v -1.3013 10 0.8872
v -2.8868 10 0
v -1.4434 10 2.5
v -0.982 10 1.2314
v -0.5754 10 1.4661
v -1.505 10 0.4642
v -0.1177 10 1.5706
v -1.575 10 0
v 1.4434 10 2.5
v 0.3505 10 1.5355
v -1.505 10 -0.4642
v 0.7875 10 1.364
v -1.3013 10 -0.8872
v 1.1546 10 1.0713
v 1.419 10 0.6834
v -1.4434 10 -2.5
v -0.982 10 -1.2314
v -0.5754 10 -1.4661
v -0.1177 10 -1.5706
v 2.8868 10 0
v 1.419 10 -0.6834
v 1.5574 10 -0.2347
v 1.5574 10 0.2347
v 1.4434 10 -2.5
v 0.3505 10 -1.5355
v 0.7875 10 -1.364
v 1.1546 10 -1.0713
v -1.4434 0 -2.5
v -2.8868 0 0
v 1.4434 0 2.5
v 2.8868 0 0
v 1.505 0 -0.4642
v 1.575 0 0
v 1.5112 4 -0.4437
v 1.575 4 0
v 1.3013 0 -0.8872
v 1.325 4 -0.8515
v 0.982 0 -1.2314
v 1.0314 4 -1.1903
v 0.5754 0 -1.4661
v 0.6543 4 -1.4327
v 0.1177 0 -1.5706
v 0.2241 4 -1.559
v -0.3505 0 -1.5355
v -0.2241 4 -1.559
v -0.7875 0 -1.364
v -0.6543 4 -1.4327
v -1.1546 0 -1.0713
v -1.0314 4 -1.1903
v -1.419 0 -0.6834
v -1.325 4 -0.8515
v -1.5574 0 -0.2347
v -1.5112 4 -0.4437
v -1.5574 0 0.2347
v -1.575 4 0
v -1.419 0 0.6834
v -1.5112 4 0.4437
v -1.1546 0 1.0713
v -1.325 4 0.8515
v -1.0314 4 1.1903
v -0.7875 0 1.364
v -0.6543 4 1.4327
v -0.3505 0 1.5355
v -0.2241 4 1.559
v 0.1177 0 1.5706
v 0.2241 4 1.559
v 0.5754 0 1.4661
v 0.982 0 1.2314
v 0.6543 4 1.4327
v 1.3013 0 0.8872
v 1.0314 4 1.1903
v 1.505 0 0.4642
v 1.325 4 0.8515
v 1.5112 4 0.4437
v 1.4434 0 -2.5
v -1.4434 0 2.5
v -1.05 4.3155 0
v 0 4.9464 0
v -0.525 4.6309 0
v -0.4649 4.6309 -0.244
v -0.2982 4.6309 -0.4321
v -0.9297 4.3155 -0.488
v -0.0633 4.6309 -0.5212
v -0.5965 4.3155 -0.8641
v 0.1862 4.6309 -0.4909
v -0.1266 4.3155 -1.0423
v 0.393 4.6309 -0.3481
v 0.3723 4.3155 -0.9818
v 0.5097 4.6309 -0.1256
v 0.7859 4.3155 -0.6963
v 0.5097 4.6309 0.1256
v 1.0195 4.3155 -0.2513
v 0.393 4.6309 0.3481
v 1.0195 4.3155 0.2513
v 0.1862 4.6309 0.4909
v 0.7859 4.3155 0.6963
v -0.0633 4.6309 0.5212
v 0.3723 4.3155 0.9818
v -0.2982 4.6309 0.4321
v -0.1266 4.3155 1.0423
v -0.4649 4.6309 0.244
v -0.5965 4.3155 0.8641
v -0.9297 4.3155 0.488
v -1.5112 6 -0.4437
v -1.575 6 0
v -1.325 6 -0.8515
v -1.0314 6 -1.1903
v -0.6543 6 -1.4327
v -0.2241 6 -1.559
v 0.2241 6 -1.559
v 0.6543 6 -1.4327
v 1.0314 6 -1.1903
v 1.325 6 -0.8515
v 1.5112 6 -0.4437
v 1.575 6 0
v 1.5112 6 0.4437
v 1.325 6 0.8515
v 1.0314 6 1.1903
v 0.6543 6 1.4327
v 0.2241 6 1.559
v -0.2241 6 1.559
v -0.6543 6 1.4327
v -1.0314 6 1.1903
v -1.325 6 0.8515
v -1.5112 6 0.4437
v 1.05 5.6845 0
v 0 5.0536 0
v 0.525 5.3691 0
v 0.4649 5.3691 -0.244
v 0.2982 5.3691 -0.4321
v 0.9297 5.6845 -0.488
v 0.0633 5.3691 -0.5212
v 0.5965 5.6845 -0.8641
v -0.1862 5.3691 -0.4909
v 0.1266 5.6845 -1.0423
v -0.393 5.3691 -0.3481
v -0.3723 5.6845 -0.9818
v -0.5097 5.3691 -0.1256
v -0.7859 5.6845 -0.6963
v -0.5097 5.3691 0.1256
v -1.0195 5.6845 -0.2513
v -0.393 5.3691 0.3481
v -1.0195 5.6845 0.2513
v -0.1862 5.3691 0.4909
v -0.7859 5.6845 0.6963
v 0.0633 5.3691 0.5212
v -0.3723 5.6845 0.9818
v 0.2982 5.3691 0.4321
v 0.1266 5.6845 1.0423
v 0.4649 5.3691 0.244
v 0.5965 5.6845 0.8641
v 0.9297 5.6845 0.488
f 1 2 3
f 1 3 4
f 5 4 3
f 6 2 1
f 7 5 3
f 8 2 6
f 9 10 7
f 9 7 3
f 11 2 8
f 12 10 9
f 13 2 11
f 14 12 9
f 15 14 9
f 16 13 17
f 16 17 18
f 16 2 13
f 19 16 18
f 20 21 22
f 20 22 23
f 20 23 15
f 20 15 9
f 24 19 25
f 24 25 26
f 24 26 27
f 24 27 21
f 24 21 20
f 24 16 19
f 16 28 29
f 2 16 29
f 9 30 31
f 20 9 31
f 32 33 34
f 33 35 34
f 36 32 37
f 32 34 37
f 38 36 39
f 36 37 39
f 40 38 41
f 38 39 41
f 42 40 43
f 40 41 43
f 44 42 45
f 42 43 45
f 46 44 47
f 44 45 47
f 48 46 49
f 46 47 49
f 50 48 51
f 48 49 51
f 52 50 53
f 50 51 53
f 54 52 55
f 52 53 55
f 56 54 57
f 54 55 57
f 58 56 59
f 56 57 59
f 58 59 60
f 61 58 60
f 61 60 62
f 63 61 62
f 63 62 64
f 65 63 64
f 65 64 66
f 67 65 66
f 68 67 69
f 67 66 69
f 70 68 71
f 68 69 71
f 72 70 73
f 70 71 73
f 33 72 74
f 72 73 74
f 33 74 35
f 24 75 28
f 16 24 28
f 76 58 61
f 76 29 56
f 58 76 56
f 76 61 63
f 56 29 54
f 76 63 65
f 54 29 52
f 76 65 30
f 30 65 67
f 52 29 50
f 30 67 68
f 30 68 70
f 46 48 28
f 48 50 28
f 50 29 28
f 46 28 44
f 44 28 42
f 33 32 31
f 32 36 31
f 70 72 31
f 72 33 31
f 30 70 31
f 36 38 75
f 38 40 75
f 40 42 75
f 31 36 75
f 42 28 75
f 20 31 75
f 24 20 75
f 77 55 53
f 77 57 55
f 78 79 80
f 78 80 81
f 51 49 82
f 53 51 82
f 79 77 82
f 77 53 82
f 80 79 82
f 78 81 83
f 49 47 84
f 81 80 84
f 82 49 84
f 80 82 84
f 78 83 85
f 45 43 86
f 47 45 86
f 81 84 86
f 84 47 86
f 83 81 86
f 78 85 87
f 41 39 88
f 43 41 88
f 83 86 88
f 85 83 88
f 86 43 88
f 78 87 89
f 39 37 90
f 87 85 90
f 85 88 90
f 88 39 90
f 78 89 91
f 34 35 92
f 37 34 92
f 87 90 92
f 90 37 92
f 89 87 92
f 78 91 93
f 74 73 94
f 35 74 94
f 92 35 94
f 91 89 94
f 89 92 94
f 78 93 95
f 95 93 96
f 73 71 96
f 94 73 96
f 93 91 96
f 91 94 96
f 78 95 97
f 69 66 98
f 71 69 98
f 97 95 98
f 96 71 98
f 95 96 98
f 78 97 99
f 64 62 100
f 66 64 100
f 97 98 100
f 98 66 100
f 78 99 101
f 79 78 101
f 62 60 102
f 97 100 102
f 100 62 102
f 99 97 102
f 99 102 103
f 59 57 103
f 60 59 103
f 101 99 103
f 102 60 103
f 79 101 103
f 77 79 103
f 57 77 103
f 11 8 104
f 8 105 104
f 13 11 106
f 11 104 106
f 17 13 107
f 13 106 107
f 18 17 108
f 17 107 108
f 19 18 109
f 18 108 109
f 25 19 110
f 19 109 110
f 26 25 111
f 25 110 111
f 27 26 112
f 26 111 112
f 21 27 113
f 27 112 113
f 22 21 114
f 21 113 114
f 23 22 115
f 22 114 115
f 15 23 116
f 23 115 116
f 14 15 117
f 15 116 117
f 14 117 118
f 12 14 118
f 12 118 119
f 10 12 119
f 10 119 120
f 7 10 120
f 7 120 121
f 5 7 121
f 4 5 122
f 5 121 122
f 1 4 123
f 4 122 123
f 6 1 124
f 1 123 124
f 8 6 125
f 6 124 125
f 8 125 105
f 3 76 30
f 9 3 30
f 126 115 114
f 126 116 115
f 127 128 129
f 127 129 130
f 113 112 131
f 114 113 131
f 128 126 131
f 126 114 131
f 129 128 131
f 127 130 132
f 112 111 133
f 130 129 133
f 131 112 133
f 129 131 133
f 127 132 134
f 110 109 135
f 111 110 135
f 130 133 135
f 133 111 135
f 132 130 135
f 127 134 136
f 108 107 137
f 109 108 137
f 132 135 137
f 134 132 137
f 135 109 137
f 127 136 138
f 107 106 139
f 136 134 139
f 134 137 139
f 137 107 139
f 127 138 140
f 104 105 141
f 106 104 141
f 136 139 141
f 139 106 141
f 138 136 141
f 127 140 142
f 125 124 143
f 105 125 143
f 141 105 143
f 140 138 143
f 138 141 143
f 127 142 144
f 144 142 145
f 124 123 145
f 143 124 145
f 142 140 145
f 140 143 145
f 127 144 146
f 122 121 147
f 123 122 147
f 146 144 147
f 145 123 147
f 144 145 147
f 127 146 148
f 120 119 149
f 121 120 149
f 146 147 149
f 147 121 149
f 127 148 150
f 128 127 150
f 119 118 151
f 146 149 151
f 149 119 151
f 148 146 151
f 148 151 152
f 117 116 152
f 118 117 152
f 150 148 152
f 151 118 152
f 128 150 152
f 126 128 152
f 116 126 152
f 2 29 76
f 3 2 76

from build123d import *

# Parameters (mm, degrees)
EXTRUDE_1_DEPTH         = 10
HOLE_WIZARD_M36_D       = 3.15
HOLE_WIZARD_M36_DEPTH   = 4
HOLE_WIZARD_M36_TIP     = 0.946355475
HOLE_WIZARD_M36_2_D     = 3.15
HOLE_WIZARD_M36_2_DEPTH = 4
HOLE_WIZARD_M36_2_TIP   = 0.946355475


with BuildPart() as part:
    # Эскиз1 → Бобышка-Вытянуть1 (new body)
    with BuildSketch(Plane(origin=(0, 0, 0), x_dir=(1, 0, 0), z_dir=(0, 1, 0))):
        Polygon((2.886751346, 0), (1.443375673, 2.5), (-1.443375673, 2.5), (-2.886751346, 0), (-1.443375673, -2.5), (1.443375673, -2.5), align=None)
    extrude(amount=EXTRUDE_1_DEPTH)

    # Hole Wizard M36
    with Locations(Plane(origin=(0, 10, 0), x_dir=(1, 0, 0), z_dir=(0, 1, 0))):
        with Locations((0, 0)):
            Hole(HOLE_WIZARD_M36_D / 2, depth=HOLE_WIZARD_M36_DEPTH)
            with Locations((0, 0, -(HOLE_WIZARD_M36_DEPTH + HOLE_WIZARD_M36_TIP / 2))):  # 118° drill point
                Cone(0, HOLE_WIZARD_M36_D / 2, HOLE_WIZARD_M36_TIP, mode=Mode.SUBTRACT)

    # Hole Wizard M36 2
    with Locations(Plane(origin=(0, 0, 0), x_dir=(-1, 0, 0), z_dir=(0, -1, 0))):
        with Locations((0, 0)):
            Hole(HOLE_WIZARD_M36_2_D / 2, depth=HOLE_WIZARD_M36_2_DEPTH)
            with Locations((0, 0, -(HOLE_WIZARD_M36_2_DEPTH + HOLE_WIZARD_M36_2_TIP / 2))):  # 118° drill point
                Cone(0, HOLE_WIZARD_M36_2_D / 2, HOLE_WIZARD_M36_2_TIP, mode=Mode.SUBTRACT)


solid = part.part
